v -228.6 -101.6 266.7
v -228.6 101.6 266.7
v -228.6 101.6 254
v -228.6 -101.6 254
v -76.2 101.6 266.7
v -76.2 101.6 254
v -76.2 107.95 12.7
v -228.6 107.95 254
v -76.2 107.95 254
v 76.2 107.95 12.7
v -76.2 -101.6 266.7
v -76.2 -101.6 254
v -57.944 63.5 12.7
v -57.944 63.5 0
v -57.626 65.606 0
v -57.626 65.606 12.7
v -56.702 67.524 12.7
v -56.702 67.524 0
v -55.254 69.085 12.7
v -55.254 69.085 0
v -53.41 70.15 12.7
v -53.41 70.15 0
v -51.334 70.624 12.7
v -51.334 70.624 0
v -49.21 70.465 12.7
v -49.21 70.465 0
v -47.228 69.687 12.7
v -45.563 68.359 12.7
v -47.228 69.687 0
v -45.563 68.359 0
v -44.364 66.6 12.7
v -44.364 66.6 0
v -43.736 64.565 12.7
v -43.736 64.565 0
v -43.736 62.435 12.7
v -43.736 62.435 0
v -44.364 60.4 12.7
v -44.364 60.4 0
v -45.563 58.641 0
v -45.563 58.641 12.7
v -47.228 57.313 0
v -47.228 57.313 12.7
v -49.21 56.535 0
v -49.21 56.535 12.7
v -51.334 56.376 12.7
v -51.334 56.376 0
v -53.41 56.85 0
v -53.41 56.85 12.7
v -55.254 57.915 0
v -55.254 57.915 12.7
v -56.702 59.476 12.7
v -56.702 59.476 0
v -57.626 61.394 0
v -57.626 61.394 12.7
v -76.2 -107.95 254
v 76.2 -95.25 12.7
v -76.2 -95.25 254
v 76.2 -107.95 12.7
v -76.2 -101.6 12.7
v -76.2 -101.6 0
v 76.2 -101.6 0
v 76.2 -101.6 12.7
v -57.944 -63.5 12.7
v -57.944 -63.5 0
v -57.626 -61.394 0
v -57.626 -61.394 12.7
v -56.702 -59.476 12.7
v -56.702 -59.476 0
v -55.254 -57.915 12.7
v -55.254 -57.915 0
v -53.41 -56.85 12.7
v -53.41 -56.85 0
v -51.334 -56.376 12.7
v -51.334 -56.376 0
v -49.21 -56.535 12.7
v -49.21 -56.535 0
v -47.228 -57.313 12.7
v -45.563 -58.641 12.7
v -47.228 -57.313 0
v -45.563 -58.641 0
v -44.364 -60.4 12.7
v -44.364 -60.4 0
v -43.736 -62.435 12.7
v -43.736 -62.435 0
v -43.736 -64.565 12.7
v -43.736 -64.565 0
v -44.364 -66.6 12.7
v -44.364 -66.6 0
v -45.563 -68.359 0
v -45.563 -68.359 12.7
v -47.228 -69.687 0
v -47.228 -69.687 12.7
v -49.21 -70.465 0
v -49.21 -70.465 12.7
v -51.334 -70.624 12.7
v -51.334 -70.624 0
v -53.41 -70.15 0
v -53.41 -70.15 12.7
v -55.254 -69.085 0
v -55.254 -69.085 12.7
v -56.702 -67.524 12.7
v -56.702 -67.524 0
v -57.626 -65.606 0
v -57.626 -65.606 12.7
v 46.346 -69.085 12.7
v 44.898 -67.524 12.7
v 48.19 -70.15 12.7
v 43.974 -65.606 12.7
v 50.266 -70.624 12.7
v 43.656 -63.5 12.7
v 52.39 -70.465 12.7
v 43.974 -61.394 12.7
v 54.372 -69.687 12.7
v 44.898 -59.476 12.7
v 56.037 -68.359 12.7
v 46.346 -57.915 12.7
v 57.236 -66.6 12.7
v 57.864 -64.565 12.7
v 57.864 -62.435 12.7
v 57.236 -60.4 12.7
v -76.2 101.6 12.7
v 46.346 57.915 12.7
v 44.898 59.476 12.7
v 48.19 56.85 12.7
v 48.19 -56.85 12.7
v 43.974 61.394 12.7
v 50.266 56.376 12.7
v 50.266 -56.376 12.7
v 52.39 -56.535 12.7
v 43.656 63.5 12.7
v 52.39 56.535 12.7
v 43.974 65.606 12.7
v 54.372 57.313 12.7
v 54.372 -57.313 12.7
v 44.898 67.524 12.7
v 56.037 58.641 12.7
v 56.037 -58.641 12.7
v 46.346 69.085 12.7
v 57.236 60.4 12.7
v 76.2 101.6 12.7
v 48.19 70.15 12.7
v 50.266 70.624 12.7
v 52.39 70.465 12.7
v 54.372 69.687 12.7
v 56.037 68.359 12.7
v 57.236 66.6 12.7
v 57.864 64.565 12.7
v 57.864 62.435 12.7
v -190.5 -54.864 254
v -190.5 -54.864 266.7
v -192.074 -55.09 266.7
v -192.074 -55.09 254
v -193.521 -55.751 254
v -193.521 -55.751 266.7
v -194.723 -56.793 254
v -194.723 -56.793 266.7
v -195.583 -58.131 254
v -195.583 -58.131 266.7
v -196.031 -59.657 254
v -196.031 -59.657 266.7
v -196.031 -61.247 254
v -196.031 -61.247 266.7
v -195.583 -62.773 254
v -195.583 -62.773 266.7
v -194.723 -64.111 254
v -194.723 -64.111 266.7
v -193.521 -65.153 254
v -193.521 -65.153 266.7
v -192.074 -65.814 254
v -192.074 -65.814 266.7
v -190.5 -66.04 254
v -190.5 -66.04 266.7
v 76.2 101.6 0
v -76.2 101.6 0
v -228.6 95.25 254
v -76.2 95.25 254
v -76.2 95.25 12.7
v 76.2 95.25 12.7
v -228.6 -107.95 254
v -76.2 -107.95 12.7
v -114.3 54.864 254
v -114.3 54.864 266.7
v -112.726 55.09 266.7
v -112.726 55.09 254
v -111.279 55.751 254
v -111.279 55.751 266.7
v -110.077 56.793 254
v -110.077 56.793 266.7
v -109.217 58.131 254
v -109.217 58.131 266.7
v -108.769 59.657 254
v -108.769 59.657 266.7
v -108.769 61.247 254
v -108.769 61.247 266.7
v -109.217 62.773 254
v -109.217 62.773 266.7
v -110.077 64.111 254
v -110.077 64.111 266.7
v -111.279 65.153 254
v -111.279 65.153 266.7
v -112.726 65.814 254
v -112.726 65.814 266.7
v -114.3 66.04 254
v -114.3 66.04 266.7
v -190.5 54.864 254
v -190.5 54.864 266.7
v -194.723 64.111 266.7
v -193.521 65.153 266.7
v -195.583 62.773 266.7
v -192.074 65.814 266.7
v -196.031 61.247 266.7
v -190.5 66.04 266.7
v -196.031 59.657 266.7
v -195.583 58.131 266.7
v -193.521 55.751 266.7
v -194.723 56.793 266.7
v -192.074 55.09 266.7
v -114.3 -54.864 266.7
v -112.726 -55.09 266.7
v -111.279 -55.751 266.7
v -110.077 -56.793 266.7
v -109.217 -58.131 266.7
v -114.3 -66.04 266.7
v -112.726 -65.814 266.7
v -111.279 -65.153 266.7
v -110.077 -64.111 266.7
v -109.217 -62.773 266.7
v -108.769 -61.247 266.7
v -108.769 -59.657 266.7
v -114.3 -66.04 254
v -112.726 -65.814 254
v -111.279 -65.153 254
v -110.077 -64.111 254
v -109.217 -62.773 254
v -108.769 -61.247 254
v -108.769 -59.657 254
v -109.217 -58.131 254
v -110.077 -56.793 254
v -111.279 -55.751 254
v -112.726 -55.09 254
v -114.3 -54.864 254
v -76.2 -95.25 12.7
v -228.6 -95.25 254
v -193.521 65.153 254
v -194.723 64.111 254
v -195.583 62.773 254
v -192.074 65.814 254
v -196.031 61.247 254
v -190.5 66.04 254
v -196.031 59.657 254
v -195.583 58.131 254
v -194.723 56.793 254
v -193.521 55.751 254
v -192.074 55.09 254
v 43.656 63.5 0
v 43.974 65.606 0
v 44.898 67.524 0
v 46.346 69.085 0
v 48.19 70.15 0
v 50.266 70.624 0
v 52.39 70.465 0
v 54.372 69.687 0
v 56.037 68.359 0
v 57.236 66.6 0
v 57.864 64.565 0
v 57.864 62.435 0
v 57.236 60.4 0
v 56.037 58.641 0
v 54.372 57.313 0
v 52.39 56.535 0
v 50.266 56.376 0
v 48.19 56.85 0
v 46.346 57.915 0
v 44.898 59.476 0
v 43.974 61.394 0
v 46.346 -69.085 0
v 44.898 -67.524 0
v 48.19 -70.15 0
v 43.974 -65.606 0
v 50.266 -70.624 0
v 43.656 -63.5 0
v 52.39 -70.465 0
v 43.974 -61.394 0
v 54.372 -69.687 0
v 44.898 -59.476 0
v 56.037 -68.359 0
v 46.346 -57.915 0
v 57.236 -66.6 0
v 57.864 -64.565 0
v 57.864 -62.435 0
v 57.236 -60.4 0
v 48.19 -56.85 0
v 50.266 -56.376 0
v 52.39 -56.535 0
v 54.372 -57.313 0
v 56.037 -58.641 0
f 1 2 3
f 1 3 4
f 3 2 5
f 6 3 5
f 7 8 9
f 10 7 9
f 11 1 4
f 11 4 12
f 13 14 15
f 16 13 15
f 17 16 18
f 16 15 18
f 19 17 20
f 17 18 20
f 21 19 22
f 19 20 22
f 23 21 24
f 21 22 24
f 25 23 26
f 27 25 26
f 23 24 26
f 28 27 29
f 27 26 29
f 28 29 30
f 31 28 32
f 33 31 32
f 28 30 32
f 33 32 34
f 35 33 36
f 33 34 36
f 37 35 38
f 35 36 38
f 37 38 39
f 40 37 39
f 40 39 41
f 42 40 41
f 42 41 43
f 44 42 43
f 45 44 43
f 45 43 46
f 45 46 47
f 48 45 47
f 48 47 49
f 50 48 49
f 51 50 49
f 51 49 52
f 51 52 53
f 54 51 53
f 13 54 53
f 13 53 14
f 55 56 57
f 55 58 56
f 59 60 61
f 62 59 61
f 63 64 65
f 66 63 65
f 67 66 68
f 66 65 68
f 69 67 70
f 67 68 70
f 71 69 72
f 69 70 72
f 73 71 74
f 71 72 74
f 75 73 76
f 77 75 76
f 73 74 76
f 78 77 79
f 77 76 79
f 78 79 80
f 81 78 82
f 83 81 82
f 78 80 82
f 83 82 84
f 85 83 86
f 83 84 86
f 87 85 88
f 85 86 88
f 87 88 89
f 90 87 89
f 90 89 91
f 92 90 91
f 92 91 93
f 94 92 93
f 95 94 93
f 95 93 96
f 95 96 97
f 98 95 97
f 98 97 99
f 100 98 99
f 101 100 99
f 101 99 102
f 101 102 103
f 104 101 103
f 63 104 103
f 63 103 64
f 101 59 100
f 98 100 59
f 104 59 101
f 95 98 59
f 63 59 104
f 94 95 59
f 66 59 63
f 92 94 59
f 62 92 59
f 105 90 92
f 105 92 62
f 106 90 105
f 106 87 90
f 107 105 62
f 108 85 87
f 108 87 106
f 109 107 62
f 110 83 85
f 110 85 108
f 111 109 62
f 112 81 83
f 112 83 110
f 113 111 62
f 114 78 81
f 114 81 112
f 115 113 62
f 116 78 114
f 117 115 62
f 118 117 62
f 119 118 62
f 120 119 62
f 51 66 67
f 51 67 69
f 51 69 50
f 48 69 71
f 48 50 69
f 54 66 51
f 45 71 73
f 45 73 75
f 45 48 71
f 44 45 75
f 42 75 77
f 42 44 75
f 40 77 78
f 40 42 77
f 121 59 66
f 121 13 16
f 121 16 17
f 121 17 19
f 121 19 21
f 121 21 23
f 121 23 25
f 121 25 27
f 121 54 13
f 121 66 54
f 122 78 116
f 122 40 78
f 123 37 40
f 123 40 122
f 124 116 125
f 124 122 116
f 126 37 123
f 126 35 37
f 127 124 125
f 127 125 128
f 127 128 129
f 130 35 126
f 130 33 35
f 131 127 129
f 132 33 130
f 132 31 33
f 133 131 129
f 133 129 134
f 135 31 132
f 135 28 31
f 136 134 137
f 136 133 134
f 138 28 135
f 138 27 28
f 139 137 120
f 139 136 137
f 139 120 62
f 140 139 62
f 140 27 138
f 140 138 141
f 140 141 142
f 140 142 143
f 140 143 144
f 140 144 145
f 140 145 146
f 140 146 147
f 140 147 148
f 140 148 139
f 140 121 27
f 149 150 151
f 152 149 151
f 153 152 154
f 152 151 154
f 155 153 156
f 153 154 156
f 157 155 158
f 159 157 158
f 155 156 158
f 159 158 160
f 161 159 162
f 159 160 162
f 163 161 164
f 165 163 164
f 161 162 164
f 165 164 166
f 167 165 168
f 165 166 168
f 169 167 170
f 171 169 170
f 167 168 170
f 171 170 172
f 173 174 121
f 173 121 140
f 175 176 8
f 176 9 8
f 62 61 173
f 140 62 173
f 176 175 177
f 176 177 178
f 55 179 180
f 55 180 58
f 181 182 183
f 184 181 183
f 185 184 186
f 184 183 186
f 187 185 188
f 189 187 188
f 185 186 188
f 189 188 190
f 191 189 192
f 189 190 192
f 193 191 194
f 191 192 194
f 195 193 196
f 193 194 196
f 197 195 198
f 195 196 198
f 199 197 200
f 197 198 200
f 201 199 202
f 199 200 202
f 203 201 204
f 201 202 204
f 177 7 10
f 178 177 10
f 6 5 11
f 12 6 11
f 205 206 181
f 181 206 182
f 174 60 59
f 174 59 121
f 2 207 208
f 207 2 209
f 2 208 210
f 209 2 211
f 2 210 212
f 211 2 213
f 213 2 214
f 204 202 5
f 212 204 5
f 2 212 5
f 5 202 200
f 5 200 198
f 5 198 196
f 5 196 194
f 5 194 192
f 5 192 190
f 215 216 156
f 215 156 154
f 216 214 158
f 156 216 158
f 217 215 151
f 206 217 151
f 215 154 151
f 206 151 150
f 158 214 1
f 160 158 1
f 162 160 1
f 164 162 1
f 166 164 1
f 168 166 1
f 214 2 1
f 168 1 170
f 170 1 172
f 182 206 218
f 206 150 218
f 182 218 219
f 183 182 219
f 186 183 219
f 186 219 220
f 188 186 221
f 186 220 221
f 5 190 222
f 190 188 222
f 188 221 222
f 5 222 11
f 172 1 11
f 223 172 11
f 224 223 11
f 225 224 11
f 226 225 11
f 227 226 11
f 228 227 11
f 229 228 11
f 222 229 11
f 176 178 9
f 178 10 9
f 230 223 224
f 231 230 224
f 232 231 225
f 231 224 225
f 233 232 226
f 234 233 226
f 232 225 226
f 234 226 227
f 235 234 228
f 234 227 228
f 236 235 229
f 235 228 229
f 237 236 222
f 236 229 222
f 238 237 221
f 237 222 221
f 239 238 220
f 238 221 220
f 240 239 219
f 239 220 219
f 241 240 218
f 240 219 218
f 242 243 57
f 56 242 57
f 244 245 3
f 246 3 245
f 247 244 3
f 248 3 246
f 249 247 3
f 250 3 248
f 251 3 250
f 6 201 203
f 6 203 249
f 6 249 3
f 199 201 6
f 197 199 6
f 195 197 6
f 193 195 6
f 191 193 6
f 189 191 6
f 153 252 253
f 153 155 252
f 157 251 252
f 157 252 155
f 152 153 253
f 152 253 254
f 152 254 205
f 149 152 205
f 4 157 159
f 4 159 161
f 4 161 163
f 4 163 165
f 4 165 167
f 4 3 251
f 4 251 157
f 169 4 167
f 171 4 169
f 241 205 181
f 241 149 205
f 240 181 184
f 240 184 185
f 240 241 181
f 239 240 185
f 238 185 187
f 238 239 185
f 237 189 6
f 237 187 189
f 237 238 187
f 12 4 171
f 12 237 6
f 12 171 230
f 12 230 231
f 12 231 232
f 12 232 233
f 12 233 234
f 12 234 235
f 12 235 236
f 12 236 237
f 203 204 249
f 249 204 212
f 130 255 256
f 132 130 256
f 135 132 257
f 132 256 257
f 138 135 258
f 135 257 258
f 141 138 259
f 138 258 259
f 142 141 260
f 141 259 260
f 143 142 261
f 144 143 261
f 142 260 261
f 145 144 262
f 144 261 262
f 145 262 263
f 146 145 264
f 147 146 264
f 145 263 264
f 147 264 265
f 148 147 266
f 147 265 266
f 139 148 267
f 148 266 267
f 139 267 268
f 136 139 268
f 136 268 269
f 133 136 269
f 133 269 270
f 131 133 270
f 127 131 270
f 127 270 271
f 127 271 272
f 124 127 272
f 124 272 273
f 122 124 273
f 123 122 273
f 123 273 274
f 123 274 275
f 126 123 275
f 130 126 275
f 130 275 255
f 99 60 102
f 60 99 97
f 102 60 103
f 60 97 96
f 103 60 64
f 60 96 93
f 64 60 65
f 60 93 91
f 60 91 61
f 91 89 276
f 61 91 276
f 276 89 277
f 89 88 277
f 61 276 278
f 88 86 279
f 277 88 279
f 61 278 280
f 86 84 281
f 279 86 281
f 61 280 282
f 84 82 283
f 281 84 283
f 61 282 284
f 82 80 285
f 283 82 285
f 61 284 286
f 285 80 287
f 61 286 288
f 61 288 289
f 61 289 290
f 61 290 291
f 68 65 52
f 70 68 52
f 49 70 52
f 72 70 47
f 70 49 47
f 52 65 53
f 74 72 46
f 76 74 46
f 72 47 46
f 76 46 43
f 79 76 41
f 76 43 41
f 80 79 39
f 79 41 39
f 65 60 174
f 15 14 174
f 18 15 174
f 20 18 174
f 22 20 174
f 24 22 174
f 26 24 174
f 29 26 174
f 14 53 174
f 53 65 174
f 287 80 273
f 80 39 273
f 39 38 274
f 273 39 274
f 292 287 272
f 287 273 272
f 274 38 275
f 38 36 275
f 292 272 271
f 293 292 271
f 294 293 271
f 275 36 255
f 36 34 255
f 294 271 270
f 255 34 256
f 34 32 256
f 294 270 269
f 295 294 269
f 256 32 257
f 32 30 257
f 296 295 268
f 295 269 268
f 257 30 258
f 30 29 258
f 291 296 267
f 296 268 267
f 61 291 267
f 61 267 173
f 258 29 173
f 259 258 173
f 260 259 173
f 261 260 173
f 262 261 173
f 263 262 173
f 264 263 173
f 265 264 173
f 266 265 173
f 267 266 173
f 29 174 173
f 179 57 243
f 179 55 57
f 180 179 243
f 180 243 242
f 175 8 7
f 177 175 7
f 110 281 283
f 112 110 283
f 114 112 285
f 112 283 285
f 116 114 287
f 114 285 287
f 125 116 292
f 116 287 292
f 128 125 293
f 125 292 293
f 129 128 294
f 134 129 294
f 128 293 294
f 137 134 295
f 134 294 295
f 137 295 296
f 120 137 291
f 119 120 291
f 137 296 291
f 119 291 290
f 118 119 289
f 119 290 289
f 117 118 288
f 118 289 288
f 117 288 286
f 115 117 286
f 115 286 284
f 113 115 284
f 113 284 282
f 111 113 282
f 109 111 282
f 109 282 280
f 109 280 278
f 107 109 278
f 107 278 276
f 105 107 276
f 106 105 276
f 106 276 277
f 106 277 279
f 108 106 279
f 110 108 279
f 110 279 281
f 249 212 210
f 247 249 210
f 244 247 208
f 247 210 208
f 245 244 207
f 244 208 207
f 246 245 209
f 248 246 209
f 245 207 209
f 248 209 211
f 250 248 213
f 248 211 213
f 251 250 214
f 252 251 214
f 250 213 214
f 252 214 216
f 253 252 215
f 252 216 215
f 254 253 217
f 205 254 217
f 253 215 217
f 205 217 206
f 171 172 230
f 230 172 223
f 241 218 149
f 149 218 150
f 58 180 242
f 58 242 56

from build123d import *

# Parameters (mm, degrees)
F0_W      = 152.4
F0_H      = 203.2
F1_DEPTH  = 12.7
F3_D      = 14.2875
F5_W      = 152.4
F5_H      = 203.2
F6_DEPTH  = 12.7
F8_DEPTH  = 266.701
F10_DEPTH = 6.35


# Not quite as in the source:
# - a length typed as a fraction of an inch, garbled in the dataset ("3 / 203.2 mm" for 3/8 in), is restored


with BuildPart() as f1:
    # F0 (on Top) → F1 (new body)
    with BuildSketch(Plane.XY):
        Rectangle(F0_W, F0_H)
    extrude(amount=F1_DEPTH)

    # F3 (through all)
    with Locations(Plane.XY.offset(12.7)):
        with Locations((-50.8, 63.5), (50.8, 63.5), (-50.8, -63.5), (50.8, -63.5)):
            Hole(F3_D / 2)


with BuildPart() as f6:
    # F5 (on offset) → F6 (new body)
    with BuildSketch(Plane(origin=(0, 0, 266.7), x_dir=(1, 0, 0), z_dir=(0, 0, -1))):
        with Locations((-152.4, 0)):
            Rectangle(F5_W, F5_H)
    extrude(amount=F6_DEPTH)

    # F7 (on face) → F8 (cut, through all)
    with BuildSketch(Plane.XY.offset(266.7)):
        with BuildLine():
            ThreePointArc((-190.5, -54.864), (-196.088, -60.452), (-190.5, -66.04))
            Line((-190.5, -66.04), (-114.3, -66.04))
            ThreePointArc((-114.3, -66.04), (-108.712, -60.452), (-114.3, -54.864))
            Line((-114.3, -54.864), (-190.5, -54.864))
        make_face()
        with BuildLine():
            Line((-190.5, 54.864), (-114.3, 54.864))
            ThreePointArc((-114.3, 54.864), (-108.712, 60.452), (-114.3, 66.04))
            Line((-114.3, 66.04), (-190.5, 66.04))
            ThreePointArc((-190.5, 66.04), (-196.088, 60.452), (-190.5, 54.864))
        make_face()
    extrude(amount=-F8_DEPTH, mode=Mode.SUBTRACT)


with BuildPart() as f10:
    # F9 (on face) → F10 (new body, symmetric)
    with BuildSketch(Plane.XZ.offset(101.6)):
        Polygon((-76.2, 254), (-228.6, 254), (-76.2, 12.7), (76.2, 12.7), align=None)
    extrude(amount=F10_DEPTH, both=True)


with BuildPart() as f11_1:
    # F11: instance of F10
    add(f10.part.mirror(Plane.XZ))


solid = Compound([f1.part, f6.part, f10.part, f11_1.part])
